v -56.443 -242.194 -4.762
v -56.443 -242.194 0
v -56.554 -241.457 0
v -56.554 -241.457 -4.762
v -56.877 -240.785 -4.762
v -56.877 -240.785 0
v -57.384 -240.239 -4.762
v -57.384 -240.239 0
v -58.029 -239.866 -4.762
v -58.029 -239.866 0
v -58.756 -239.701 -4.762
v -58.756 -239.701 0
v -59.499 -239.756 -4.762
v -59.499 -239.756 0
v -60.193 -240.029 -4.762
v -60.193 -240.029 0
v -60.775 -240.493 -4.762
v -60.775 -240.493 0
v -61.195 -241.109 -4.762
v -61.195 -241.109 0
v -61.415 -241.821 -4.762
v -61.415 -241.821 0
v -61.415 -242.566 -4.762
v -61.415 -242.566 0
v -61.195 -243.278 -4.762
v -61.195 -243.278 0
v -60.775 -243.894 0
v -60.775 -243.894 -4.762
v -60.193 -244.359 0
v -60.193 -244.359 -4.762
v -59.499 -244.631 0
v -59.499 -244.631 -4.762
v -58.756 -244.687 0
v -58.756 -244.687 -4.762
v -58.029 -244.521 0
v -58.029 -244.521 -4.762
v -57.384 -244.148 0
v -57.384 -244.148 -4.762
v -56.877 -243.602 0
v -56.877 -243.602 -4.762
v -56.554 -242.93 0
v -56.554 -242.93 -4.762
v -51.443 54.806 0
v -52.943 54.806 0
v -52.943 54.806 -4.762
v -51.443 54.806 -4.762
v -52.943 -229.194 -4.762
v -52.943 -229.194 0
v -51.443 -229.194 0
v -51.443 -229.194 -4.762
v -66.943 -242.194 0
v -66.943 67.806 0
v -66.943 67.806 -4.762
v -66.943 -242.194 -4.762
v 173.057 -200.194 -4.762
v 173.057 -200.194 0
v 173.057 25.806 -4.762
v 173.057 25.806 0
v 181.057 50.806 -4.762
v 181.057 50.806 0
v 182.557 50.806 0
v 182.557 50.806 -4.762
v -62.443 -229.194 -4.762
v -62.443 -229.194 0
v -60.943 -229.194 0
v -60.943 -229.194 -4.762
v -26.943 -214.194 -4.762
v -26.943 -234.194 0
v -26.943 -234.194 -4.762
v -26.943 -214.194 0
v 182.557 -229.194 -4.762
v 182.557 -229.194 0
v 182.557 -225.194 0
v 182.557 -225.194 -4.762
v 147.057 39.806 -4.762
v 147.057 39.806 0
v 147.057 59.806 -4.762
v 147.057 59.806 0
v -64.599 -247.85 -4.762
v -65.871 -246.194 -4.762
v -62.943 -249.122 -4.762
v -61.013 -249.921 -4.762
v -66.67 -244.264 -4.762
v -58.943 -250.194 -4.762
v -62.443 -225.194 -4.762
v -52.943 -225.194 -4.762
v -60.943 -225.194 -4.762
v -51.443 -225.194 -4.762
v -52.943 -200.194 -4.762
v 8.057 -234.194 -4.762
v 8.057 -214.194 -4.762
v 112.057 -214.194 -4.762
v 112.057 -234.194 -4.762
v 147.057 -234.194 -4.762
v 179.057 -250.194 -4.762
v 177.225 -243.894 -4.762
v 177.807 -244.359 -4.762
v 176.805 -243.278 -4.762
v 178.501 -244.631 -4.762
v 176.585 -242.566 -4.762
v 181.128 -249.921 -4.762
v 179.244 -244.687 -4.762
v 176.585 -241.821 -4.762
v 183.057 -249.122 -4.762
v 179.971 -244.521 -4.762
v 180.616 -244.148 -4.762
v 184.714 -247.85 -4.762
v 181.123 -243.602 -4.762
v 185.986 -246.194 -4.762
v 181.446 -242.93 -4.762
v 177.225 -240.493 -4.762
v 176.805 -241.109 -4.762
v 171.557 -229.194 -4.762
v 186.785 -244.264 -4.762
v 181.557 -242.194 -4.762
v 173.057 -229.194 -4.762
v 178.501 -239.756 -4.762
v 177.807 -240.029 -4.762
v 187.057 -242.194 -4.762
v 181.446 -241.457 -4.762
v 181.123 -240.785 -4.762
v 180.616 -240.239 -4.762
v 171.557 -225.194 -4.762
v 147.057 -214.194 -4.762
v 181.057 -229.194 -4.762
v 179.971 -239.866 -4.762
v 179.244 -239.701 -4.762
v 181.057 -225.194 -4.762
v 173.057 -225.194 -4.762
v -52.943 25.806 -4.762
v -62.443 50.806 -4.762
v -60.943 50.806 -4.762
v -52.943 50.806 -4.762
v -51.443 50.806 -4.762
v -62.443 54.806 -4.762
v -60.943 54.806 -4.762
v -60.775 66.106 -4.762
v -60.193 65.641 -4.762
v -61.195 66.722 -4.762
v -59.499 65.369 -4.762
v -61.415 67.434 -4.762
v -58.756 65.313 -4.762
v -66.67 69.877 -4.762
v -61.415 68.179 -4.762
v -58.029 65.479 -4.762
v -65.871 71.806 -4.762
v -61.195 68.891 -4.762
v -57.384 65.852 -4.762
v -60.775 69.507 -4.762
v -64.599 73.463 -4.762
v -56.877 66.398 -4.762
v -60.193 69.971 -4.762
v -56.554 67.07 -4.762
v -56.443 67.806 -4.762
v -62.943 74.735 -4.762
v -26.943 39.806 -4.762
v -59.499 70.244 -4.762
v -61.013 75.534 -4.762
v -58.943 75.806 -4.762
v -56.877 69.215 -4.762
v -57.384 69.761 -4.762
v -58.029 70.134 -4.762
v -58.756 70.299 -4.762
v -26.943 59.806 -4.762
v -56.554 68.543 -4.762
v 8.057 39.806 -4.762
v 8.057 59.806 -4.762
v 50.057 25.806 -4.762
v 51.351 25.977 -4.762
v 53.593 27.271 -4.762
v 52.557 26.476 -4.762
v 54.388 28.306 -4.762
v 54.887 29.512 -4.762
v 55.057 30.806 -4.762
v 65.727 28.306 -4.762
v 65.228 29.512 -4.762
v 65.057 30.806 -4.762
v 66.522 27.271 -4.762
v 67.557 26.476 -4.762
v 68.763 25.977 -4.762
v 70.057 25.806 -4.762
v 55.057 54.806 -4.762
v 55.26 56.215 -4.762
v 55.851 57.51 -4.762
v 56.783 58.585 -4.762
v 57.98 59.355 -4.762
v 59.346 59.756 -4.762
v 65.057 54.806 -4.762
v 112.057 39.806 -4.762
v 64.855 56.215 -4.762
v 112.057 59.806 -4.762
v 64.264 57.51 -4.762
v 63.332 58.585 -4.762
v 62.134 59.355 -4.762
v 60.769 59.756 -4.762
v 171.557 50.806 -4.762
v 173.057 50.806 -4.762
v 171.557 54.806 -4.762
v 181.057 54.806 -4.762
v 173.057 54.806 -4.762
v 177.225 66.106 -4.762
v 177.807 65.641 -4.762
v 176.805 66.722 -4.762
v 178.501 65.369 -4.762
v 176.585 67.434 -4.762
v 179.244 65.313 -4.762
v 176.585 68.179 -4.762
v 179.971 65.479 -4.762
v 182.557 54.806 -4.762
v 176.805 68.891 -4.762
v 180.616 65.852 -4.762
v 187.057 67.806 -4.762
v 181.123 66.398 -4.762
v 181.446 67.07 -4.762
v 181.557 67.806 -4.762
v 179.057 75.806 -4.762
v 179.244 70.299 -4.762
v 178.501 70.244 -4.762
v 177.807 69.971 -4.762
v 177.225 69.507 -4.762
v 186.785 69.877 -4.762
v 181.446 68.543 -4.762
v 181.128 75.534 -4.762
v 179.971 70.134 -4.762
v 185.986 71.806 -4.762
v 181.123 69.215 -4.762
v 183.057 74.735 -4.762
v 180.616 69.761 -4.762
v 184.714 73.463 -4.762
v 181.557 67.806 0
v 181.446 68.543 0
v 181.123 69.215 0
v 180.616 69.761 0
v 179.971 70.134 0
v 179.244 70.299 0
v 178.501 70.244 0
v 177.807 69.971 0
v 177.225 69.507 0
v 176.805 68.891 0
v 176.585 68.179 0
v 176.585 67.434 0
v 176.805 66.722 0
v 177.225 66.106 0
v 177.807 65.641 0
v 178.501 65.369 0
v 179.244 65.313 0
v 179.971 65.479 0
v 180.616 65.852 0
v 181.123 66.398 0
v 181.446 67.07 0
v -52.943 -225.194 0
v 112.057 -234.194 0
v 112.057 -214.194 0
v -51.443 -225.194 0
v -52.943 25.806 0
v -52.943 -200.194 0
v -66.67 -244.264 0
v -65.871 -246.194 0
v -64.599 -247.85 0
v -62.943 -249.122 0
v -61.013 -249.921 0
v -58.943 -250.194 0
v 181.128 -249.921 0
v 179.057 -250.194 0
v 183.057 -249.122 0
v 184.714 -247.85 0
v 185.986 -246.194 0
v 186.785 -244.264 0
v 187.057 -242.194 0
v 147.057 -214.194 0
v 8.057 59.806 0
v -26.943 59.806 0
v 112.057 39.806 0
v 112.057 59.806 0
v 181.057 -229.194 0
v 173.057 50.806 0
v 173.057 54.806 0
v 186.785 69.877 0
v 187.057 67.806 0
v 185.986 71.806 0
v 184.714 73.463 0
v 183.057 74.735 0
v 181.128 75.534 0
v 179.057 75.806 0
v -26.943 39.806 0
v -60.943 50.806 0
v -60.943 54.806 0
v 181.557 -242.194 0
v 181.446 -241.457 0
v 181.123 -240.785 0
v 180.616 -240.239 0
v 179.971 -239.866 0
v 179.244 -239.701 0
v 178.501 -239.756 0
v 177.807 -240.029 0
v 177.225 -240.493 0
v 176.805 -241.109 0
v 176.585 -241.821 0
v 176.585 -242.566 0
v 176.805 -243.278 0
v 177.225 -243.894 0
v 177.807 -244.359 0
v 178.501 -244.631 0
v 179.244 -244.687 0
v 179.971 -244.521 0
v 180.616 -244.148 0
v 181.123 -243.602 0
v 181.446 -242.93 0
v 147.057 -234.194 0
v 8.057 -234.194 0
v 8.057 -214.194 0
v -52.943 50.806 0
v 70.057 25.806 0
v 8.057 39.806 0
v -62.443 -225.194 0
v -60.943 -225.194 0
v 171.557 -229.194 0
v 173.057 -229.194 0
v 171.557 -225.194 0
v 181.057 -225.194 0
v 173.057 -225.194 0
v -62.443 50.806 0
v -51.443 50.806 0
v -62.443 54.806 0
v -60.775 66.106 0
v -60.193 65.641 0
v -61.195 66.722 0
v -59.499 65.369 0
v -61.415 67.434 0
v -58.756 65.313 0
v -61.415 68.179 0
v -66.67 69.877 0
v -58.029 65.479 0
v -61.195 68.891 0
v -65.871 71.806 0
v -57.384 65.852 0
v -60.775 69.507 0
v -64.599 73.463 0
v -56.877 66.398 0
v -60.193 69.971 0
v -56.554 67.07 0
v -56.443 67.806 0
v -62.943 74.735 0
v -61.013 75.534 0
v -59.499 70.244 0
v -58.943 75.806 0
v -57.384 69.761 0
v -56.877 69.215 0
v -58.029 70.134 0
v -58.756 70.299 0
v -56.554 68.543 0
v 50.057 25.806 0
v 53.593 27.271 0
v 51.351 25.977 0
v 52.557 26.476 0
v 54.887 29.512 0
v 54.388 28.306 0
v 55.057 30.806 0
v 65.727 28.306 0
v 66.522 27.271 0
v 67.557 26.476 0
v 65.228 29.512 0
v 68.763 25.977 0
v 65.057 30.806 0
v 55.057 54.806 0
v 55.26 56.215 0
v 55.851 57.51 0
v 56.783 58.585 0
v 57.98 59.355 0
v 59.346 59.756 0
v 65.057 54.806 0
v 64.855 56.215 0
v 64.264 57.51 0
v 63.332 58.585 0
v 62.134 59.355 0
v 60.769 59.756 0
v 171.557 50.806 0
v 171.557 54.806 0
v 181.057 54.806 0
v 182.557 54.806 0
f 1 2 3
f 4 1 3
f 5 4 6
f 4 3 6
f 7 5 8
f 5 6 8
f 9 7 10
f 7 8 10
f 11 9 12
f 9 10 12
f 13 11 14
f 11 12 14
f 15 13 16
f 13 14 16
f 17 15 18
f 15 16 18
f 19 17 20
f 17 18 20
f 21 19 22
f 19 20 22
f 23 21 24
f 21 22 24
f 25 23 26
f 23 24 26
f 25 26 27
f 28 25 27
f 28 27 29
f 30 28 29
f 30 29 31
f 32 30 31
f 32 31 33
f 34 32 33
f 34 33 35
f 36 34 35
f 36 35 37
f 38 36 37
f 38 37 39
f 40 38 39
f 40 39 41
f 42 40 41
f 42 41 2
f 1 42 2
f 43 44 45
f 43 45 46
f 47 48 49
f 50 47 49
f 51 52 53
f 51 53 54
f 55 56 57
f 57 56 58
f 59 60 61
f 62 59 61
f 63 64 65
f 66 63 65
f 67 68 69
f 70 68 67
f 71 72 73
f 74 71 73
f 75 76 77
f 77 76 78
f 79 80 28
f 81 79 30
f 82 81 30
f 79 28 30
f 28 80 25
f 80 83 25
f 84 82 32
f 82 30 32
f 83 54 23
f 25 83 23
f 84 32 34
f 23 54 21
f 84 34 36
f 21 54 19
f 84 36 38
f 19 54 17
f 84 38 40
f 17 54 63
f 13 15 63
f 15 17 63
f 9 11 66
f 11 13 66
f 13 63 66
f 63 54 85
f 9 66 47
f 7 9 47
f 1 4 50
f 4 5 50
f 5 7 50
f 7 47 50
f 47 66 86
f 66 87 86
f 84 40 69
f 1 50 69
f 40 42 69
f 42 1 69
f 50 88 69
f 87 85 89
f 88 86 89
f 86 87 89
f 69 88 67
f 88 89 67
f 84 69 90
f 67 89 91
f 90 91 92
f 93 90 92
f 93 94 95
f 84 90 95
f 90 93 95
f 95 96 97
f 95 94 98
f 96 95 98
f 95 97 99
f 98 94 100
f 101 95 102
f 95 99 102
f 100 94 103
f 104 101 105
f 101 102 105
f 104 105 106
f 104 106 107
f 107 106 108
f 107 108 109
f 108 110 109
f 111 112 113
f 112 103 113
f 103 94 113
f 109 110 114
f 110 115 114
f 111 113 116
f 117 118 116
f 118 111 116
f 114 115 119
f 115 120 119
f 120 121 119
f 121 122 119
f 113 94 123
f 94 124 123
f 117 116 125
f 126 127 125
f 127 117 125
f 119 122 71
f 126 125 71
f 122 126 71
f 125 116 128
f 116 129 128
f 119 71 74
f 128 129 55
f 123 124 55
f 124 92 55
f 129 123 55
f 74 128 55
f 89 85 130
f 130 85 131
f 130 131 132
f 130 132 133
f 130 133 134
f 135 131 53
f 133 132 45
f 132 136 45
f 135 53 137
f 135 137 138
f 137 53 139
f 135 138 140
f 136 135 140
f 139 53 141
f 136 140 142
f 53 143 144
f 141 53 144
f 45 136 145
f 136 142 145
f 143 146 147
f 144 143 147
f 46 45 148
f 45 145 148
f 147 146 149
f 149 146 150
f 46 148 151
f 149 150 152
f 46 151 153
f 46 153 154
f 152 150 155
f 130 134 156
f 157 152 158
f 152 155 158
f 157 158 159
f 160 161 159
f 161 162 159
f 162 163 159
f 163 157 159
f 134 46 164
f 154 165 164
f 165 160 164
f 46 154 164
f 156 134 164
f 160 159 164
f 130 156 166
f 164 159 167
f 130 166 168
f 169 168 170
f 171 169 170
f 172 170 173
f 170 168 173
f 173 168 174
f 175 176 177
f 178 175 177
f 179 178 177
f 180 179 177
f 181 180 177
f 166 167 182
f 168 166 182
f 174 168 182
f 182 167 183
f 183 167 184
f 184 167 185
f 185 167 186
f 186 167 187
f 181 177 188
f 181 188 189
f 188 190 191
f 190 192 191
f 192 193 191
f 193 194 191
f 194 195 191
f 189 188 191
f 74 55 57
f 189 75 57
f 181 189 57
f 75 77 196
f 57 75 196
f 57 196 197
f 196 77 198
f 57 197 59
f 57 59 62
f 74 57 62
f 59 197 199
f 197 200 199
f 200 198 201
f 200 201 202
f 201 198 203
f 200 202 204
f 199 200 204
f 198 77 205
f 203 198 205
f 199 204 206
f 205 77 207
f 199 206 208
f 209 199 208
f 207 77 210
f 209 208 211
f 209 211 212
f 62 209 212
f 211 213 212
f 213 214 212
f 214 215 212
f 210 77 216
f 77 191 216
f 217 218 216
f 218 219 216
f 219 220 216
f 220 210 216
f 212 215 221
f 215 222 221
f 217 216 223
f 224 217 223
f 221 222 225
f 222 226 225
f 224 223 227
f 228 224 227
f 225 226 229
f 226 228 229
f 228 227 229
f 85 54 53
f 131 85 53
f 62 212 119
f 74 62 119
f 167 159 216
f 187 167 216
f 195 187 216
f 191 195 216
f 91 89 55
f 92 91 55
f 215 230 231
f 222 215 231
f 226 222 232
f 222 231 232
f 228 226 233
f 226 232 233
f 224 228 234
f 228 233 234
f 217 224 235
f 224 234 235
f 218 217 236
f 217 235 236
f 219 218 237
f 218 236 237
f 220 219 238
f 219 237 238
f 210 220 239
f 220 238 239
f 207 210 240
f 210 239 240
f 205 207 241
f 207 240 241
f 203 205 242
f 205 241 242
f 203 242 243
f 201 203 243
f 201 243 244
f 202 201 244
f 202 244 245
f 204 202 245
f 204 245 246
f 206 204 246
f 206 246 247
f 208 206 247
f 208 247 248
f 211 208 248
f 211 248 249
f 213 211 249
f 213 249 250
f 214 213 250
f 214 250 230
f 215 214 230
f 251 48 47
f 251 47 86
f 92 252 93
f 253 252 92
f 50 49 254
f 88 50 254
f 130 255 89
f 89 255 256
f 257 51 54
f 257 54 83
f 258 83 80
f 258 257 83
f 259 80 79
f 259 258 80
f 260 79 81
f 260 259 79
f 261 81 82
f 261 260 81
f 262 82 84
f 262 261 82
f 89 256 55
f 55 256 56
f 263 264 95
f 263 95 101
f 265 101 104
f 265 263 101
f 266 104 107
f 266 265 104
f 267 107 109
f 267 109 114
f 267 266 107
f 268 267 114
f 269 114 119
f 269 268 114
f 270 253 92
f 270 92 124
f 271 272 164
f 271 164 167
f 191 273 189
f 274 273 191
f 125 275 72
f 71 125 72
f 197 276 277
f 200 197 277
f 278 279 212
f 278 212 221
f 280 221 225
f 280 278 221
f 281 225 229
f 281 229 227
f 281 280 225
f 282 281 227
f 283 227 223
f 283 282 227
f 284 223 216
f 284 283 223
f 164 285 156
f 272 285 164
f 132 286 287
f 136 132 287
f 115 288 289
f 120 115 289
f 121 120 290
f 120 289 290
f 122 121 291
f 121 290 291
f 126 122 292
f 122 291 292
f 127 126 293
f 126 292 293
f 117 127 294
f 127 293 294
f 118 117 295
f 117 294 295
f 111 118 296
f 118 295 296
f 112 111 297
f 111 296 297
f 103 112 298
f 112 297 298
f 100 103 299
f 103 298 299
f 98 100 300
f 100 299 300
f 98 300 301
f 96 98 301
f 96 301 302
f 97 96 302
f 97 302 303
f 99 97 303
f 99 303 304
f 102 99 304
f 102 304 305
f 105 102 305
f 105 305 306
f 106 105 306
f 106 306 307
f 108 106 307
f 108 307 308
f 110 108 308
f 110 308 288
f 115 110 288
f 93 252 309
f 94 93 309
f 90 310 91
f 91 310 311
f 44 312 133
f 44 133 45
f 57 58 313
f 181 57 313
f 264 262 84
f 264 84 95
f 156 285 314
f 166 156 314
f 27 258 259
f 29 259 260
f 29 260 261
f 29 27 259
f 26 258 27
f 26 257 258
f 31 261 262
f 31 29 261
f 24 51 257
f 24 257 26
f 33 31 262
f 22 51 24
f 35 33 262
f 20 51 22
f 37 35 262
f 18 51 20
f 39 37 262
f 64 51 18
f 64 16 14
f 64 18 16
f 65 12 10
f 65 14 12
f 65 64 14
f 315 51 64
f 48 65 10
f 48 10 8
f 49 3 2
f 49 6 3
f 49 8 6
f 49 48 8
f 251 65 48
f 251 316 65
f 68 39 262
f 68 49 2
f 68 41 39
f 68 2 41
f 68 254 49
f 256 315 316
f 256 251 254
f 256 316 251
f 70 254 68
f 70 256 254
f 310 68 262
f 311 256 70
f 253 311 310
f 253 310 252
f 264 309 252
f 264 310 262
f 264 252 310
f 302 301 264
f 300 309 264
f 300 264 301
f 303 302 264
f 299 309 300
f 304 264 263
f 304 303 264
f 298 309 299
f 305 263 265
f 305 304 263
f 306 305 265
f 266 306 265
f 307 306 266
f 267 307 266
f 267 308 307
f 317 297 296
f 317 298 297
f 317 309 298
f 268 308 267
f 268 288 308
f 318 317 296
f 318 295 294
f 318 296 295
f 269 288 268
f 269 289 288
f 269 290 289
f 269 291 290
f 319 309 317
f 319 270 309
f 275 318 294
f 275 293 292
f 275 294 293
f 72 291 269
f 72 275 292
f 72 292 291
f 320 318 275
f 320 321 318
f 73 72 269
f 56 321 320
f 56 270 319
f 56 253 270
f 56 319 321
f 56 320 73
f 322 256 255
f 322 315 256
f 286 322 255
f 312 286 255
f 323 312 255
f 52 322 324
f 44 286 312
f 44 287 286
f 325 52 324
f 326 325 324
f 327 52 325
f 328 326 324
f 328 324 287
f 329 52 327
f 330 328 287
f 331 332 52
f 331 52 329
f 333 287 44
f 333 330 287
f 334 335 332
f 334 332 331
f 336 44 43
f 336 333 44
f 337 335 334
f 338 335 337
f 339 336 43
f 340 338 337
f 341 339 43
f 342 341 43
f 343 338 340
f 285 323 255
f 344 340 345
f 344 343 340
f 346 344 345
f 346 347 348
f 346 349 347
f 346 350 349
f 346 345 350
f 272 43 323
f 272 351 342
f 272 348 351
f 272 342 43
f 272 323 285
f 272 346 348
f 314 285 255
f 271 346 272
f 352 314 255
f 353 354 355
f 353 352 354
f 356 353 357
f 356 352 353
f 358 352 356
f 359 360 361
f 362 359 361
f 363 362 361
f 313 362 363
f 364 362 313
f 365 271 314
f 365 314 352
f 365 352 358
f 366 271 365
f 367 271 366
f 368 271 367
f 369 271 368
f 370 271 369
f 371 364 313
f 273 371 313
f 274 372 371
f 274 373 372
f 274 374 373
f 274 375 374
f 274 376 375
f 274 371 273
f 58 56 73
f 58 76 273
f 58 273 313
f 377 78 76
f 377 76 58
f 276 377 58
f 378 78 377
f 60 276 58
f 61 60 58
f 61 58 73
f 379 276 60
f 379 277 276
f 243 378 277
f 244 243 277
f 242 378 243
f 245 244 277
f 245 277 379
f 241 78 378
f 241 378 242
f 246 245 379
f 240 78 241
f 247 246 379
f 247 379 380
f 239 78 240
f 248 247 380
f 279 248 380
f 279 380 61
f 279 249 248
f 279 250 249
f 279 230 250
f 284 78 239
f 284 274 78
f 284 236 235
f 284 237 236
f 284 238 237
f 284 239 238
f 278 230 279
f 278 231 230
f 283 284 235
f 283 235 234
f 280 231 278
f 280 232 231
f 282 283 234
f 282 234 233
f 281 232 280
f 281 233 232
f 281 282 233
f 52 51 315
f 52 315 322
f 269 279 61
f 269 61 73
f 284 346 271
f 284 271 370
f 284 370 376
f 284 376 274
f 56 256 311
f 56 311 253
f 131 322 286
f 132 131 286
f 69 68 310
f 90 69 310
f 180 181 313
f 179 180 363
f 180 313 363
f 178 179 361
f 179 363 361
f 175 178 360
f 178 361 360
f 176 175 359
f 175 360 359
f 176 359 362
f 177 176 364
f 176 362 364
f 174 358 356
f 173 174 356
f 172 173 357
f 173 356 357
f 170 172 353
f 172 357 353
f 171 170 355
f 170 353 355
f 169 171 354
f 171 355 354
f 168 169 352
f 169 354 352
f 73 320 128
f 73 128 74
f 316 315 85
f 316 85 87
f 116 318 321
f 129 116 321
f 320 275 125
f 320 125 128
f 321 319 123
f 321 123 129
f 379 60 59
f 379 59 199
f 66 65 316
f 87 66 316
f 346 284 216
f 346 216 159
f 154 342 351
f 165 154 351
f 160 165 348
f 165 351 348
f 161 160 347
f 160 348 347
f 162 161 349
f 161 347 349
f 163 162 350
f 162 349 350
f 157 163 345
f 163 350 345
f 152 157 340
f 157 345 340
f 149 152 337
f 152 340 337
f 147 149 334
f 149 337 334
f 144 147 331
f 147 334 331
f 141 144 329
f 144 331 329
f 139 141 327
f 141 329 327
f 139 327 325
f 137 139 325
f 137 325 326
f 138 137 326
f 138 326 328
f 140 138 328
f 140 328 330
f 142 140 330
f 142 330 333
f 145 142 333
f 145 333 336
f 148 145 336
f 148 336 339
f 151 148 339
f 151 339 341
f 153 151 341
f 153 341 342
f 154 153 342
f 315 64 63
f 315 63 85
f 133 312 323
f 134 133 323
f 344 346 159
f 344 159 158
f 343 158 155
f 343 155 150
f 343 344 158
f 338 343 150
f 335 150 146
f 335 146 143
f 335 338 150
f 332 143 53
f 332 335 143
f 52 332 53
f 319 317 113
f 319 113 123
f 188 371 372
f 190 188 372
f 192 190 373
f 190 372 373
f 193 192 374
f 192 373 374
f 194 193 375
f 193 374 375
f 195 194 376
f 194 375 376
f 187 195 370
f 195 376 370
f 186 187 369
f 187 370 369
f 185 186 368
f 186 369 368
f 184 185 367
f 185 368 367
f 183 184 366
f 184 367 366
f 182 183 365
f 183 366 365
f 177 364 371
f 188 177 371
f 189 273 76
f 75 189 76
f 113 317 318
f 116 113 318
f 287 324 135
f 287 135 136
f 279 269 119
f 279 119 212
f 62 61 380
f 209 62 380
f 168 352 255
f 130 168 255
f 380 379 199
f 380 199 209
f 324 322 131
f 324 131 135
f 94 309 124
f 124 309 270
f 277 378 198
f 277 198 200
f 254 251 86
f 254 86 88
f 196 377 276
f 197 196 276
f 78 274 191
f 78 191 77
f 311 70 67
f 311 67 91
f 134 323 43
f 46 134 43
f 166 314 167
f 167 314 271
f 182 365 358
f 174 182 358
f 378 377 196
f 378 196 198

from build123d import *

# Parameters (mm, degrees)
BOSS_EXTRUDE1_DEPTH = 4.7625
SKETCH2_R           = 2.5
SKETCH2_W           = 35
SKETCH2_H           = 20
SKETCH2_W_2         = 1.5
SKETCH2_H_2         = 4
CUT_EXTRUDE1_DEPTH  = 10


with BuildPart() as part:
    # Sketch1 → Boss-Extrude1 (new body)
    with BuildSketch(Plane.XY):
        with BuildLine():
            Line((-66.942601108, 67.806403557), (-66.942601108, -242.193596443))
            ThreePointArc((-66.942601108, -242.193596443), (-64.599455358, -247.850450692), (-58.942601108, -250.193596443))
            Line((-58.942601108, -250.193596443), (179.057398892, -250.193596443))
            ThreePointArc((179.057398892, -250.193596443), (184.714253141, -247.850450692), (187.057398892, -242.193596443))
            Line((187.057398892, -242.193596443), (187.057398892, 67.806403557))
            ThreePointArc((187.057398892, 67.806403557), (184.714253141, 73.463257807), (179.057398892, 75.806403557))
            Line((179.057398892, 75.806403557), (-58.942601108, 75.806403557))
            ThreePointArc((-58.942601108, 75.806403557), (-64.599455358, 73.463257807), (-66.942601108, 67.806403557))
        make_face()
    extrude(amount=-BOSS_EXTRUDE1_DEPTH)

    # Sketch2 → Cut-Extrude1 (cut)
    with BuildSketch(Plane.XY):
        with Locations((179.057398892, 67.806403557)):
            Circle(SKETCH2_R)
        with Locations((-58.942601108, 67.806403557)):
            Circle(SKETCH2_R)
        with Locations((-58.942601108, -242.193596443)):
            Circle(SKETCH2_R)
        with Locations((179.057398892, -242.193596443)):
            Circle(SKETCH2_R)
        with BuildLine():
            Line((173.057398892, 25.806403557), (70.057398892, 25.806403557))
            ThreePointArc((70.057398892, 25.806403557), (66.521864986, 27.270869651), (65.057398892, 30.806403557))
            Line((65.057398892, 30.806403557), (65.057398892, 54.806403557))
            ThreePointArc((65.057398892, 54.806403557), (60.057398892, 59.806403557), (55.057398892, 54.806403557))
            Line((55.057398892, 54.806403557), (55.057398892, 30.806403557))
            ThreePointArc((55.057398892, 30.806403557), (53.592932798, 27.270869651), (50.057398892, 25.806403557))
            Line((50.057398892, 25.806403557), (-52.942601108, 25.806403557))
            Line((-52.942601108, 25.806403557), (-52.942601108, -200.193596443))
            Line((-52.942601108, -200.193596443), (173.057398892, -200.193596443))
            Line((173.057398892, -200.193596443), (173.057398892, 25.806403557))
        make_face()
        with Locations((-9.442601108, 49.806403557)):
            Rectangle(SKETCH2_W, SKETCH2_H)
        with Locations((129.557398892, 49.806403557)):
            Rectangle(SKETCH2_W, SKETCH2_H)
        with Locations((-61.692601108, 52.806403557)):
            Rectangle(SKETCH2_W_2, SKETCH2_H_2)
        with Locations((-52.192601108, 52.806403557)):
            Rectangle(SKETCH2_W_2, SKETCH2_H_2)
        with Locations((172.307398892, 52.806403557)):
            Rectangle(SKETCH2_W_2, SKETCH2_H_2)
        with Locations((181.807398892, 52.806403557)):
            Rectangle(SKETCH2_W_2, SKETCH2_H_2)
        with Locations((-9.442601108, -224.193596443)):
            Rectangle(SKETCH2_W, SKETCH2_H)
        with Locations((-61.692601108, -227.193596443)):
            Rectangle(SKETCH2_W_2, SKETCH2_H_2)
        with Locations((-52.192601108, -227.193596443)):
            Rectangle(SKETCH2_W_2, SKETCH2_H_2)
        with Locations((181.807398892, -227.193596443)):
            Rectangle(SKETCH2_W_2, SKETCH2_H_2)
        with Locations((172.307398892, -227.193596443)):
            Rectangle(SKETCH2_W_2, SKETCH2_H_2)
        with Locations((129.557398892, -224.193596443)):
            Rectangle(SKETCH2_W, SKETCH2_H)
    extrude(amount=-CUT_EXTRUDE1_DEPTH, mode=Mode.SUBTRACT)


solid = part.part
